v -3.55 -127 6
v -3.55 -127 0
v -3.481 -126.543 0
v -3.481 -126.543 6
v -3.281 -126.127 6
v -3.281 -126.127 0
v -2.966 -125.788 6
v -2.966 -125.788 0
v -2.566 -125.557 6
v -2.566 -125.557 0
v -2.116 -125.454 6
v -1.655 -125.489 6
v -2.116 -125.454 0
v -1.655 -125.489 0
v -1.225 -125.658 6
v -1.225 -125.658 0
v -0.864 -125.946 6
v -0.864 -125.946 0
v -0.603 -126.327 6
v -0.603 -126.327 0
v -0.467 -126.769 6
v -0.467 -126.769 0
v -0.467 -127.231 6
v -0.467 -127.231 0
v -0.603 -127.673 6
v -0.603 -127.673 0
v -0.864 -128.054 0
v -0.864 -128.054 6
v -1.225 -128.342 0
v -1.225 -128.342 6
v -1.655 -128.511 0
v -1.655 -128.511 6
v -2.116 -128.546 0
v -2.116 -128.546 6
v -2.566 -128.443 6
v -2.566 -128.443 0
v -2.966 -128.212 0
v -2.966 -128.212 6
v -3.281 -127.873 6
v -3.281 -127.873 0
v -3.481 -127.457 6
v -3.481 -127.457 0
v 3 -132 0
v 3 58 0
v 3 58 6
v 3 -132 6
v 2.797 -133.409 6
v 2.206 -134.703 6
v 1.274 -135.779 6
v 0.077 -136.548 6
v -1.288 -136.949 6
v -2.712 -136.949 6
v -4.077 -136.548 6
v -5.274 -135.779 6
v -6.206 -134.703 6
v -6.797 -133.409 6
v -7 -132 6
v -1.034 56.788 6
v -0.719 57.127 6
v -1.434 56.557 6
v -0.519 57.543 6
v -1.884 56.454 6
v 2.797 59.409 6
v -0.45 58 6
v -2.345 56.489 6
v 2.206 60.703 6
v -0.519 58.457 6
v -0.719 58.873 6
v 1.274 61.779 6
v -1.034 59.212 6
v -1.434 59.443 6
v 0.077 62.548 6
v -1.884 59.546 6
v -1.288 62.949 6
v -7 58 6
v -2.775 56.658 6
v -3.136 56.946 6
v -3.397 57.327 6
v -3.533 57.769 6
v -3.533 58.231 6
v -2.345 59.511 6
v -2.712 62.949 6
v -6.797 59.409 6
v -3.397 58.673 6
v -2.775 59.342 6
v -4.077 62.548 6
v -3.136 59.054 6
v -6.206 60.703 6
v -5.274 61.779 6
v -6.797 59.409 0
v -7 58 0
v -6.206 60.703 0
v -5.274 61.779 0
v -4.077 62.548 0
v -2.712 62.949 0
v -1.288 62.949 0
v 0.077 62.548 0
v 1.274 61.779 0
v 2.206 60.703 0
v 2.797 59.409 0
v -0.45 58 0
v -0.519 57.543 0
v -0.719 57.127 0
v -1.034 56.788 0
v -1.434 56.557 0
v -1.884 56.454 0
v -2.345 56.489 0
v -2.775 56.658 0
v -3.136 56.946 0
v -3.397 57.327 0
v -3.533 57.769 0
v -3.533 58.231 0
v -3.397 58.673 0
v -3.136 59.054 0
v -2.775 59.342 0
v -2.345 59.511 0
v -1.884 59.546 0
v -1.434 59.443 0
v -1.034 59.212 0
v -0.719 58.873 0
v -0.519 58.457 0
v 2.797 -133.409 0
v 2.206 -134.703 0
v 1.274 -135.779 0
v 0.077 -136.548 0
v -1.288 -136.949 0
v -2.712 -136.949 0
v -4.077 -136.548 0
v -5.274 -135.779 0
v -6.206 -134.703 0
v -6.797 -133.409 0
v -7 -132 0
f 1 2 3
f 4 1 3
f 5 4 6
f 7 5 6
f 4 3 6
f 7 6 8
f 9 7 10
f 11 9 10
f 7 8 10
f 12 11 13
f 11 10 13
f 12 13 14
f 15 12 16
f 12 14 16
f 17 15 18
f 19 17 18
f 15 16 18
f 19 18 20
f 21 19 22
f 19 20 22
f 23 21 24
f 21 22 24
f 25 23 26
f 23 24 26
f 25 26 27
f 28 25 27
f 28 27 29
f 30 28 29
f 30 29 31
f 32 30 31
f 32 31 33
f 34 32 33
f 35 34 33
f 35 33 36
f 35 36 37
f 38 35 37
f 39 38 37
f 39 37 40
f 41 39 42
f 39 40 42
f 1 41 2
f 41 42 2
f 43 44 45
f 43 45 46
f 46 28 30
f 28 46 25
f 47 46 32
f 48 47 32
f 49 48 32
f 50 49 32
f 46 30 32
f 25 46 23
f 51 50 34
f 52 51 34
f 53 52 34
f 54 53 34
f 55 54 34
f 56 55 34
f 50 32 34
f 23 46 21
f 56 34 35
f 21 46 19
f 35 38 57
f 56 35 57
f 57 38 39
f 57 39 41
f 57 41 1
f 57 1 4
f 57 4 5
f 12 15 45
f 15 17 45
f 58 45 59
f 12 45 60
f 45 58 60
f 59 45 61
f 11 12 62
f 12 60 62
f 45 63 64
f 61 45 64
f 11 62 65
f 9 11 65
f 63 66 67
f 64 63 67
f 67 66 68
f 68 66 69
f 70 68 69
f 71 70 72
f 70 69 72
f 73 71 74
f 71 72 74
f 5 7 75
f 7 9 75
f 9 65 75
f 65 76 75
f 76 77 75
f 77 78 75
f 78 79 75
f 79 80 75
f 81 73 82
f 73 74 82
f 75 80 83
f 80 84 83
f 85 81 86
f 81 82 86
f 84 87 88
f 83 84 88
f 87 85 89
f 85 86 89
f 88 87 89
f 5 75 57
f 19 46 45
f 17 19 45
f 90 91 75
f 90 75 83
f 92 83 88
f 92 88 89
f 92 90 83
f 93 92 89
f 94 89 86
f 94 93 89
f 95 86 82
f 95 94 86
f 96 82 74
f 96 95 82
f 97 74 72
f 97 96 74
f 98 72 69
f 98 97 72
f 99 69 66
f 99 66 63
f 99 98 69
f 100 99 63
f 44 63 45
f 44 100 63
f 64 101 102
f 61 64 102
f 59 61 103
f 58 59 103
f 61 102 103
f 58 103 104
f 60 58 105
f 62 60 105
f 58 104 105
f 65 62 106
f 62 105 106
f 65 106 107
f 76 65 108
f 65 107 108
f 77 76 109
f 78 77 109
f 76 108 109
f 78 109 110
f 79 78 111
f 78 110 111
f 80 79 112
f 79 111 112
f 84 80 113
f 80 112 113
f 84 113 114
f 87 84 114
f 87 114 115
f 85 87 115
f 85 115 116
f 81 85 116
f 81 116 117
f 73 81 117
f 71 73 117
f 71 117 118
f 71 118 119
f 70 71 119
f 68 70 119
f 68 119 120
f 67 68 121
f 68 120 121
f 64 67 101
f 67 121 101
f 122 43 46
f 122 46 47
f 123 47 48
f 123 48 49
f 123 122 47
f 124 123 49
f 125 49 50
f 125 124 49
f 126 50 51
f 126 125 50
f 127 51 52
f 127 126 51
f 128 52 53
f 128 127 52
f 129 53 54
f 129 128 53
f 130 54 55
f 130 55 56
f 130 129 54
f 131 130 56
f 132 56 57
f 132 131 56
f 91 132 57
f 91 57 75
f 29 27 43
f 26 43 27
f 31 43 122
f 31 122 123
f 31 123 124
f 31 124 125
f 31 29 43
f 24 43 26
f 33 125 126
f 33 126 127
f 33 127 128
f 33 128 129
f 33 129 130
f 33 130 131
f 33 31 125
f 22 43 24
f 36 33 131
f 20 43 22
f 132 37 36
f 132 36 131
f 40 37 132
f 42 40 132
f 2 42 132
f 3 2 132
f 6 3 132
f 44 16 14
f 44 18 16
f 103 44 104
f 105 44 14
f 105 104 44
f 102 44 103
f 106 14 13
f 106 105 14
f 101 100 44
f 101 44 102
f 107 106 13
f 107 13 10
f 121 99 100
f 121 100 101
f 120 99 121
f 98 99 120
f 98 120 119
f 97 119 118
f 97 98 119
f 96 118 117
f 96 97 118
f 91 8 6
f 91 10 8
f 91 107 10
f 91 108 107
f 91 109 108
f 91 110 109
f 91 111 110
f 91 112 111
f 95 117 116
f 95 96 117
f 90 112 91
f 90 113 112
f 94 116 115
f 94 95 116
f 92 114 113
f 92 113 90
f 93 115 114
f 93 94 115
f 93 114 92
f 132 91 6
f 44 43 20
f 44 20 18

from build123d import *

# Parameters (mm, degrees)
BOSS_EXTRU_1_DEPTH      = 6
ESQUISSE4_R             = 1.55
ENL_V_MAT_EXTRU_3_DEPTH = 6


with BuildPart() as part:
    # Esquisse3 → Boss.-Extru.1 (new body)
    with BuildSketch(Plane.XY):
        with BuildLine():
            Line((-7, -132), (-7, 58))
            ThreePointArc((-7, 58), (-2, 63), (3, 58))
            Line((3, 58), (3, -132))
            ThreePointArc((3, -132), (-2, -137), (-7, -132))
        make_face()
    extrude(amount=BOSS_EXTRU_1_DEPTH)

    # Esquisse4 → Enlèv. mat.-Extru.3 (cut)
    with BuildSketch(Plane(origin=(0, 0, 0), x_dir=(-1, 0, 0), z_dir=(0, 0, -1))):
        with Locations((2, -127)):
            Circle(ESQUISSE4_R)
        with Locations(Location((2, 58, 0), (0, 0, 180))):
            Circle(ESQUISSE4_R)
    extrude(amount=-ENL_V_MAT_EXTRU_3_DEPTH, mode=Mode.SUBTRACT)


solid = part.part
